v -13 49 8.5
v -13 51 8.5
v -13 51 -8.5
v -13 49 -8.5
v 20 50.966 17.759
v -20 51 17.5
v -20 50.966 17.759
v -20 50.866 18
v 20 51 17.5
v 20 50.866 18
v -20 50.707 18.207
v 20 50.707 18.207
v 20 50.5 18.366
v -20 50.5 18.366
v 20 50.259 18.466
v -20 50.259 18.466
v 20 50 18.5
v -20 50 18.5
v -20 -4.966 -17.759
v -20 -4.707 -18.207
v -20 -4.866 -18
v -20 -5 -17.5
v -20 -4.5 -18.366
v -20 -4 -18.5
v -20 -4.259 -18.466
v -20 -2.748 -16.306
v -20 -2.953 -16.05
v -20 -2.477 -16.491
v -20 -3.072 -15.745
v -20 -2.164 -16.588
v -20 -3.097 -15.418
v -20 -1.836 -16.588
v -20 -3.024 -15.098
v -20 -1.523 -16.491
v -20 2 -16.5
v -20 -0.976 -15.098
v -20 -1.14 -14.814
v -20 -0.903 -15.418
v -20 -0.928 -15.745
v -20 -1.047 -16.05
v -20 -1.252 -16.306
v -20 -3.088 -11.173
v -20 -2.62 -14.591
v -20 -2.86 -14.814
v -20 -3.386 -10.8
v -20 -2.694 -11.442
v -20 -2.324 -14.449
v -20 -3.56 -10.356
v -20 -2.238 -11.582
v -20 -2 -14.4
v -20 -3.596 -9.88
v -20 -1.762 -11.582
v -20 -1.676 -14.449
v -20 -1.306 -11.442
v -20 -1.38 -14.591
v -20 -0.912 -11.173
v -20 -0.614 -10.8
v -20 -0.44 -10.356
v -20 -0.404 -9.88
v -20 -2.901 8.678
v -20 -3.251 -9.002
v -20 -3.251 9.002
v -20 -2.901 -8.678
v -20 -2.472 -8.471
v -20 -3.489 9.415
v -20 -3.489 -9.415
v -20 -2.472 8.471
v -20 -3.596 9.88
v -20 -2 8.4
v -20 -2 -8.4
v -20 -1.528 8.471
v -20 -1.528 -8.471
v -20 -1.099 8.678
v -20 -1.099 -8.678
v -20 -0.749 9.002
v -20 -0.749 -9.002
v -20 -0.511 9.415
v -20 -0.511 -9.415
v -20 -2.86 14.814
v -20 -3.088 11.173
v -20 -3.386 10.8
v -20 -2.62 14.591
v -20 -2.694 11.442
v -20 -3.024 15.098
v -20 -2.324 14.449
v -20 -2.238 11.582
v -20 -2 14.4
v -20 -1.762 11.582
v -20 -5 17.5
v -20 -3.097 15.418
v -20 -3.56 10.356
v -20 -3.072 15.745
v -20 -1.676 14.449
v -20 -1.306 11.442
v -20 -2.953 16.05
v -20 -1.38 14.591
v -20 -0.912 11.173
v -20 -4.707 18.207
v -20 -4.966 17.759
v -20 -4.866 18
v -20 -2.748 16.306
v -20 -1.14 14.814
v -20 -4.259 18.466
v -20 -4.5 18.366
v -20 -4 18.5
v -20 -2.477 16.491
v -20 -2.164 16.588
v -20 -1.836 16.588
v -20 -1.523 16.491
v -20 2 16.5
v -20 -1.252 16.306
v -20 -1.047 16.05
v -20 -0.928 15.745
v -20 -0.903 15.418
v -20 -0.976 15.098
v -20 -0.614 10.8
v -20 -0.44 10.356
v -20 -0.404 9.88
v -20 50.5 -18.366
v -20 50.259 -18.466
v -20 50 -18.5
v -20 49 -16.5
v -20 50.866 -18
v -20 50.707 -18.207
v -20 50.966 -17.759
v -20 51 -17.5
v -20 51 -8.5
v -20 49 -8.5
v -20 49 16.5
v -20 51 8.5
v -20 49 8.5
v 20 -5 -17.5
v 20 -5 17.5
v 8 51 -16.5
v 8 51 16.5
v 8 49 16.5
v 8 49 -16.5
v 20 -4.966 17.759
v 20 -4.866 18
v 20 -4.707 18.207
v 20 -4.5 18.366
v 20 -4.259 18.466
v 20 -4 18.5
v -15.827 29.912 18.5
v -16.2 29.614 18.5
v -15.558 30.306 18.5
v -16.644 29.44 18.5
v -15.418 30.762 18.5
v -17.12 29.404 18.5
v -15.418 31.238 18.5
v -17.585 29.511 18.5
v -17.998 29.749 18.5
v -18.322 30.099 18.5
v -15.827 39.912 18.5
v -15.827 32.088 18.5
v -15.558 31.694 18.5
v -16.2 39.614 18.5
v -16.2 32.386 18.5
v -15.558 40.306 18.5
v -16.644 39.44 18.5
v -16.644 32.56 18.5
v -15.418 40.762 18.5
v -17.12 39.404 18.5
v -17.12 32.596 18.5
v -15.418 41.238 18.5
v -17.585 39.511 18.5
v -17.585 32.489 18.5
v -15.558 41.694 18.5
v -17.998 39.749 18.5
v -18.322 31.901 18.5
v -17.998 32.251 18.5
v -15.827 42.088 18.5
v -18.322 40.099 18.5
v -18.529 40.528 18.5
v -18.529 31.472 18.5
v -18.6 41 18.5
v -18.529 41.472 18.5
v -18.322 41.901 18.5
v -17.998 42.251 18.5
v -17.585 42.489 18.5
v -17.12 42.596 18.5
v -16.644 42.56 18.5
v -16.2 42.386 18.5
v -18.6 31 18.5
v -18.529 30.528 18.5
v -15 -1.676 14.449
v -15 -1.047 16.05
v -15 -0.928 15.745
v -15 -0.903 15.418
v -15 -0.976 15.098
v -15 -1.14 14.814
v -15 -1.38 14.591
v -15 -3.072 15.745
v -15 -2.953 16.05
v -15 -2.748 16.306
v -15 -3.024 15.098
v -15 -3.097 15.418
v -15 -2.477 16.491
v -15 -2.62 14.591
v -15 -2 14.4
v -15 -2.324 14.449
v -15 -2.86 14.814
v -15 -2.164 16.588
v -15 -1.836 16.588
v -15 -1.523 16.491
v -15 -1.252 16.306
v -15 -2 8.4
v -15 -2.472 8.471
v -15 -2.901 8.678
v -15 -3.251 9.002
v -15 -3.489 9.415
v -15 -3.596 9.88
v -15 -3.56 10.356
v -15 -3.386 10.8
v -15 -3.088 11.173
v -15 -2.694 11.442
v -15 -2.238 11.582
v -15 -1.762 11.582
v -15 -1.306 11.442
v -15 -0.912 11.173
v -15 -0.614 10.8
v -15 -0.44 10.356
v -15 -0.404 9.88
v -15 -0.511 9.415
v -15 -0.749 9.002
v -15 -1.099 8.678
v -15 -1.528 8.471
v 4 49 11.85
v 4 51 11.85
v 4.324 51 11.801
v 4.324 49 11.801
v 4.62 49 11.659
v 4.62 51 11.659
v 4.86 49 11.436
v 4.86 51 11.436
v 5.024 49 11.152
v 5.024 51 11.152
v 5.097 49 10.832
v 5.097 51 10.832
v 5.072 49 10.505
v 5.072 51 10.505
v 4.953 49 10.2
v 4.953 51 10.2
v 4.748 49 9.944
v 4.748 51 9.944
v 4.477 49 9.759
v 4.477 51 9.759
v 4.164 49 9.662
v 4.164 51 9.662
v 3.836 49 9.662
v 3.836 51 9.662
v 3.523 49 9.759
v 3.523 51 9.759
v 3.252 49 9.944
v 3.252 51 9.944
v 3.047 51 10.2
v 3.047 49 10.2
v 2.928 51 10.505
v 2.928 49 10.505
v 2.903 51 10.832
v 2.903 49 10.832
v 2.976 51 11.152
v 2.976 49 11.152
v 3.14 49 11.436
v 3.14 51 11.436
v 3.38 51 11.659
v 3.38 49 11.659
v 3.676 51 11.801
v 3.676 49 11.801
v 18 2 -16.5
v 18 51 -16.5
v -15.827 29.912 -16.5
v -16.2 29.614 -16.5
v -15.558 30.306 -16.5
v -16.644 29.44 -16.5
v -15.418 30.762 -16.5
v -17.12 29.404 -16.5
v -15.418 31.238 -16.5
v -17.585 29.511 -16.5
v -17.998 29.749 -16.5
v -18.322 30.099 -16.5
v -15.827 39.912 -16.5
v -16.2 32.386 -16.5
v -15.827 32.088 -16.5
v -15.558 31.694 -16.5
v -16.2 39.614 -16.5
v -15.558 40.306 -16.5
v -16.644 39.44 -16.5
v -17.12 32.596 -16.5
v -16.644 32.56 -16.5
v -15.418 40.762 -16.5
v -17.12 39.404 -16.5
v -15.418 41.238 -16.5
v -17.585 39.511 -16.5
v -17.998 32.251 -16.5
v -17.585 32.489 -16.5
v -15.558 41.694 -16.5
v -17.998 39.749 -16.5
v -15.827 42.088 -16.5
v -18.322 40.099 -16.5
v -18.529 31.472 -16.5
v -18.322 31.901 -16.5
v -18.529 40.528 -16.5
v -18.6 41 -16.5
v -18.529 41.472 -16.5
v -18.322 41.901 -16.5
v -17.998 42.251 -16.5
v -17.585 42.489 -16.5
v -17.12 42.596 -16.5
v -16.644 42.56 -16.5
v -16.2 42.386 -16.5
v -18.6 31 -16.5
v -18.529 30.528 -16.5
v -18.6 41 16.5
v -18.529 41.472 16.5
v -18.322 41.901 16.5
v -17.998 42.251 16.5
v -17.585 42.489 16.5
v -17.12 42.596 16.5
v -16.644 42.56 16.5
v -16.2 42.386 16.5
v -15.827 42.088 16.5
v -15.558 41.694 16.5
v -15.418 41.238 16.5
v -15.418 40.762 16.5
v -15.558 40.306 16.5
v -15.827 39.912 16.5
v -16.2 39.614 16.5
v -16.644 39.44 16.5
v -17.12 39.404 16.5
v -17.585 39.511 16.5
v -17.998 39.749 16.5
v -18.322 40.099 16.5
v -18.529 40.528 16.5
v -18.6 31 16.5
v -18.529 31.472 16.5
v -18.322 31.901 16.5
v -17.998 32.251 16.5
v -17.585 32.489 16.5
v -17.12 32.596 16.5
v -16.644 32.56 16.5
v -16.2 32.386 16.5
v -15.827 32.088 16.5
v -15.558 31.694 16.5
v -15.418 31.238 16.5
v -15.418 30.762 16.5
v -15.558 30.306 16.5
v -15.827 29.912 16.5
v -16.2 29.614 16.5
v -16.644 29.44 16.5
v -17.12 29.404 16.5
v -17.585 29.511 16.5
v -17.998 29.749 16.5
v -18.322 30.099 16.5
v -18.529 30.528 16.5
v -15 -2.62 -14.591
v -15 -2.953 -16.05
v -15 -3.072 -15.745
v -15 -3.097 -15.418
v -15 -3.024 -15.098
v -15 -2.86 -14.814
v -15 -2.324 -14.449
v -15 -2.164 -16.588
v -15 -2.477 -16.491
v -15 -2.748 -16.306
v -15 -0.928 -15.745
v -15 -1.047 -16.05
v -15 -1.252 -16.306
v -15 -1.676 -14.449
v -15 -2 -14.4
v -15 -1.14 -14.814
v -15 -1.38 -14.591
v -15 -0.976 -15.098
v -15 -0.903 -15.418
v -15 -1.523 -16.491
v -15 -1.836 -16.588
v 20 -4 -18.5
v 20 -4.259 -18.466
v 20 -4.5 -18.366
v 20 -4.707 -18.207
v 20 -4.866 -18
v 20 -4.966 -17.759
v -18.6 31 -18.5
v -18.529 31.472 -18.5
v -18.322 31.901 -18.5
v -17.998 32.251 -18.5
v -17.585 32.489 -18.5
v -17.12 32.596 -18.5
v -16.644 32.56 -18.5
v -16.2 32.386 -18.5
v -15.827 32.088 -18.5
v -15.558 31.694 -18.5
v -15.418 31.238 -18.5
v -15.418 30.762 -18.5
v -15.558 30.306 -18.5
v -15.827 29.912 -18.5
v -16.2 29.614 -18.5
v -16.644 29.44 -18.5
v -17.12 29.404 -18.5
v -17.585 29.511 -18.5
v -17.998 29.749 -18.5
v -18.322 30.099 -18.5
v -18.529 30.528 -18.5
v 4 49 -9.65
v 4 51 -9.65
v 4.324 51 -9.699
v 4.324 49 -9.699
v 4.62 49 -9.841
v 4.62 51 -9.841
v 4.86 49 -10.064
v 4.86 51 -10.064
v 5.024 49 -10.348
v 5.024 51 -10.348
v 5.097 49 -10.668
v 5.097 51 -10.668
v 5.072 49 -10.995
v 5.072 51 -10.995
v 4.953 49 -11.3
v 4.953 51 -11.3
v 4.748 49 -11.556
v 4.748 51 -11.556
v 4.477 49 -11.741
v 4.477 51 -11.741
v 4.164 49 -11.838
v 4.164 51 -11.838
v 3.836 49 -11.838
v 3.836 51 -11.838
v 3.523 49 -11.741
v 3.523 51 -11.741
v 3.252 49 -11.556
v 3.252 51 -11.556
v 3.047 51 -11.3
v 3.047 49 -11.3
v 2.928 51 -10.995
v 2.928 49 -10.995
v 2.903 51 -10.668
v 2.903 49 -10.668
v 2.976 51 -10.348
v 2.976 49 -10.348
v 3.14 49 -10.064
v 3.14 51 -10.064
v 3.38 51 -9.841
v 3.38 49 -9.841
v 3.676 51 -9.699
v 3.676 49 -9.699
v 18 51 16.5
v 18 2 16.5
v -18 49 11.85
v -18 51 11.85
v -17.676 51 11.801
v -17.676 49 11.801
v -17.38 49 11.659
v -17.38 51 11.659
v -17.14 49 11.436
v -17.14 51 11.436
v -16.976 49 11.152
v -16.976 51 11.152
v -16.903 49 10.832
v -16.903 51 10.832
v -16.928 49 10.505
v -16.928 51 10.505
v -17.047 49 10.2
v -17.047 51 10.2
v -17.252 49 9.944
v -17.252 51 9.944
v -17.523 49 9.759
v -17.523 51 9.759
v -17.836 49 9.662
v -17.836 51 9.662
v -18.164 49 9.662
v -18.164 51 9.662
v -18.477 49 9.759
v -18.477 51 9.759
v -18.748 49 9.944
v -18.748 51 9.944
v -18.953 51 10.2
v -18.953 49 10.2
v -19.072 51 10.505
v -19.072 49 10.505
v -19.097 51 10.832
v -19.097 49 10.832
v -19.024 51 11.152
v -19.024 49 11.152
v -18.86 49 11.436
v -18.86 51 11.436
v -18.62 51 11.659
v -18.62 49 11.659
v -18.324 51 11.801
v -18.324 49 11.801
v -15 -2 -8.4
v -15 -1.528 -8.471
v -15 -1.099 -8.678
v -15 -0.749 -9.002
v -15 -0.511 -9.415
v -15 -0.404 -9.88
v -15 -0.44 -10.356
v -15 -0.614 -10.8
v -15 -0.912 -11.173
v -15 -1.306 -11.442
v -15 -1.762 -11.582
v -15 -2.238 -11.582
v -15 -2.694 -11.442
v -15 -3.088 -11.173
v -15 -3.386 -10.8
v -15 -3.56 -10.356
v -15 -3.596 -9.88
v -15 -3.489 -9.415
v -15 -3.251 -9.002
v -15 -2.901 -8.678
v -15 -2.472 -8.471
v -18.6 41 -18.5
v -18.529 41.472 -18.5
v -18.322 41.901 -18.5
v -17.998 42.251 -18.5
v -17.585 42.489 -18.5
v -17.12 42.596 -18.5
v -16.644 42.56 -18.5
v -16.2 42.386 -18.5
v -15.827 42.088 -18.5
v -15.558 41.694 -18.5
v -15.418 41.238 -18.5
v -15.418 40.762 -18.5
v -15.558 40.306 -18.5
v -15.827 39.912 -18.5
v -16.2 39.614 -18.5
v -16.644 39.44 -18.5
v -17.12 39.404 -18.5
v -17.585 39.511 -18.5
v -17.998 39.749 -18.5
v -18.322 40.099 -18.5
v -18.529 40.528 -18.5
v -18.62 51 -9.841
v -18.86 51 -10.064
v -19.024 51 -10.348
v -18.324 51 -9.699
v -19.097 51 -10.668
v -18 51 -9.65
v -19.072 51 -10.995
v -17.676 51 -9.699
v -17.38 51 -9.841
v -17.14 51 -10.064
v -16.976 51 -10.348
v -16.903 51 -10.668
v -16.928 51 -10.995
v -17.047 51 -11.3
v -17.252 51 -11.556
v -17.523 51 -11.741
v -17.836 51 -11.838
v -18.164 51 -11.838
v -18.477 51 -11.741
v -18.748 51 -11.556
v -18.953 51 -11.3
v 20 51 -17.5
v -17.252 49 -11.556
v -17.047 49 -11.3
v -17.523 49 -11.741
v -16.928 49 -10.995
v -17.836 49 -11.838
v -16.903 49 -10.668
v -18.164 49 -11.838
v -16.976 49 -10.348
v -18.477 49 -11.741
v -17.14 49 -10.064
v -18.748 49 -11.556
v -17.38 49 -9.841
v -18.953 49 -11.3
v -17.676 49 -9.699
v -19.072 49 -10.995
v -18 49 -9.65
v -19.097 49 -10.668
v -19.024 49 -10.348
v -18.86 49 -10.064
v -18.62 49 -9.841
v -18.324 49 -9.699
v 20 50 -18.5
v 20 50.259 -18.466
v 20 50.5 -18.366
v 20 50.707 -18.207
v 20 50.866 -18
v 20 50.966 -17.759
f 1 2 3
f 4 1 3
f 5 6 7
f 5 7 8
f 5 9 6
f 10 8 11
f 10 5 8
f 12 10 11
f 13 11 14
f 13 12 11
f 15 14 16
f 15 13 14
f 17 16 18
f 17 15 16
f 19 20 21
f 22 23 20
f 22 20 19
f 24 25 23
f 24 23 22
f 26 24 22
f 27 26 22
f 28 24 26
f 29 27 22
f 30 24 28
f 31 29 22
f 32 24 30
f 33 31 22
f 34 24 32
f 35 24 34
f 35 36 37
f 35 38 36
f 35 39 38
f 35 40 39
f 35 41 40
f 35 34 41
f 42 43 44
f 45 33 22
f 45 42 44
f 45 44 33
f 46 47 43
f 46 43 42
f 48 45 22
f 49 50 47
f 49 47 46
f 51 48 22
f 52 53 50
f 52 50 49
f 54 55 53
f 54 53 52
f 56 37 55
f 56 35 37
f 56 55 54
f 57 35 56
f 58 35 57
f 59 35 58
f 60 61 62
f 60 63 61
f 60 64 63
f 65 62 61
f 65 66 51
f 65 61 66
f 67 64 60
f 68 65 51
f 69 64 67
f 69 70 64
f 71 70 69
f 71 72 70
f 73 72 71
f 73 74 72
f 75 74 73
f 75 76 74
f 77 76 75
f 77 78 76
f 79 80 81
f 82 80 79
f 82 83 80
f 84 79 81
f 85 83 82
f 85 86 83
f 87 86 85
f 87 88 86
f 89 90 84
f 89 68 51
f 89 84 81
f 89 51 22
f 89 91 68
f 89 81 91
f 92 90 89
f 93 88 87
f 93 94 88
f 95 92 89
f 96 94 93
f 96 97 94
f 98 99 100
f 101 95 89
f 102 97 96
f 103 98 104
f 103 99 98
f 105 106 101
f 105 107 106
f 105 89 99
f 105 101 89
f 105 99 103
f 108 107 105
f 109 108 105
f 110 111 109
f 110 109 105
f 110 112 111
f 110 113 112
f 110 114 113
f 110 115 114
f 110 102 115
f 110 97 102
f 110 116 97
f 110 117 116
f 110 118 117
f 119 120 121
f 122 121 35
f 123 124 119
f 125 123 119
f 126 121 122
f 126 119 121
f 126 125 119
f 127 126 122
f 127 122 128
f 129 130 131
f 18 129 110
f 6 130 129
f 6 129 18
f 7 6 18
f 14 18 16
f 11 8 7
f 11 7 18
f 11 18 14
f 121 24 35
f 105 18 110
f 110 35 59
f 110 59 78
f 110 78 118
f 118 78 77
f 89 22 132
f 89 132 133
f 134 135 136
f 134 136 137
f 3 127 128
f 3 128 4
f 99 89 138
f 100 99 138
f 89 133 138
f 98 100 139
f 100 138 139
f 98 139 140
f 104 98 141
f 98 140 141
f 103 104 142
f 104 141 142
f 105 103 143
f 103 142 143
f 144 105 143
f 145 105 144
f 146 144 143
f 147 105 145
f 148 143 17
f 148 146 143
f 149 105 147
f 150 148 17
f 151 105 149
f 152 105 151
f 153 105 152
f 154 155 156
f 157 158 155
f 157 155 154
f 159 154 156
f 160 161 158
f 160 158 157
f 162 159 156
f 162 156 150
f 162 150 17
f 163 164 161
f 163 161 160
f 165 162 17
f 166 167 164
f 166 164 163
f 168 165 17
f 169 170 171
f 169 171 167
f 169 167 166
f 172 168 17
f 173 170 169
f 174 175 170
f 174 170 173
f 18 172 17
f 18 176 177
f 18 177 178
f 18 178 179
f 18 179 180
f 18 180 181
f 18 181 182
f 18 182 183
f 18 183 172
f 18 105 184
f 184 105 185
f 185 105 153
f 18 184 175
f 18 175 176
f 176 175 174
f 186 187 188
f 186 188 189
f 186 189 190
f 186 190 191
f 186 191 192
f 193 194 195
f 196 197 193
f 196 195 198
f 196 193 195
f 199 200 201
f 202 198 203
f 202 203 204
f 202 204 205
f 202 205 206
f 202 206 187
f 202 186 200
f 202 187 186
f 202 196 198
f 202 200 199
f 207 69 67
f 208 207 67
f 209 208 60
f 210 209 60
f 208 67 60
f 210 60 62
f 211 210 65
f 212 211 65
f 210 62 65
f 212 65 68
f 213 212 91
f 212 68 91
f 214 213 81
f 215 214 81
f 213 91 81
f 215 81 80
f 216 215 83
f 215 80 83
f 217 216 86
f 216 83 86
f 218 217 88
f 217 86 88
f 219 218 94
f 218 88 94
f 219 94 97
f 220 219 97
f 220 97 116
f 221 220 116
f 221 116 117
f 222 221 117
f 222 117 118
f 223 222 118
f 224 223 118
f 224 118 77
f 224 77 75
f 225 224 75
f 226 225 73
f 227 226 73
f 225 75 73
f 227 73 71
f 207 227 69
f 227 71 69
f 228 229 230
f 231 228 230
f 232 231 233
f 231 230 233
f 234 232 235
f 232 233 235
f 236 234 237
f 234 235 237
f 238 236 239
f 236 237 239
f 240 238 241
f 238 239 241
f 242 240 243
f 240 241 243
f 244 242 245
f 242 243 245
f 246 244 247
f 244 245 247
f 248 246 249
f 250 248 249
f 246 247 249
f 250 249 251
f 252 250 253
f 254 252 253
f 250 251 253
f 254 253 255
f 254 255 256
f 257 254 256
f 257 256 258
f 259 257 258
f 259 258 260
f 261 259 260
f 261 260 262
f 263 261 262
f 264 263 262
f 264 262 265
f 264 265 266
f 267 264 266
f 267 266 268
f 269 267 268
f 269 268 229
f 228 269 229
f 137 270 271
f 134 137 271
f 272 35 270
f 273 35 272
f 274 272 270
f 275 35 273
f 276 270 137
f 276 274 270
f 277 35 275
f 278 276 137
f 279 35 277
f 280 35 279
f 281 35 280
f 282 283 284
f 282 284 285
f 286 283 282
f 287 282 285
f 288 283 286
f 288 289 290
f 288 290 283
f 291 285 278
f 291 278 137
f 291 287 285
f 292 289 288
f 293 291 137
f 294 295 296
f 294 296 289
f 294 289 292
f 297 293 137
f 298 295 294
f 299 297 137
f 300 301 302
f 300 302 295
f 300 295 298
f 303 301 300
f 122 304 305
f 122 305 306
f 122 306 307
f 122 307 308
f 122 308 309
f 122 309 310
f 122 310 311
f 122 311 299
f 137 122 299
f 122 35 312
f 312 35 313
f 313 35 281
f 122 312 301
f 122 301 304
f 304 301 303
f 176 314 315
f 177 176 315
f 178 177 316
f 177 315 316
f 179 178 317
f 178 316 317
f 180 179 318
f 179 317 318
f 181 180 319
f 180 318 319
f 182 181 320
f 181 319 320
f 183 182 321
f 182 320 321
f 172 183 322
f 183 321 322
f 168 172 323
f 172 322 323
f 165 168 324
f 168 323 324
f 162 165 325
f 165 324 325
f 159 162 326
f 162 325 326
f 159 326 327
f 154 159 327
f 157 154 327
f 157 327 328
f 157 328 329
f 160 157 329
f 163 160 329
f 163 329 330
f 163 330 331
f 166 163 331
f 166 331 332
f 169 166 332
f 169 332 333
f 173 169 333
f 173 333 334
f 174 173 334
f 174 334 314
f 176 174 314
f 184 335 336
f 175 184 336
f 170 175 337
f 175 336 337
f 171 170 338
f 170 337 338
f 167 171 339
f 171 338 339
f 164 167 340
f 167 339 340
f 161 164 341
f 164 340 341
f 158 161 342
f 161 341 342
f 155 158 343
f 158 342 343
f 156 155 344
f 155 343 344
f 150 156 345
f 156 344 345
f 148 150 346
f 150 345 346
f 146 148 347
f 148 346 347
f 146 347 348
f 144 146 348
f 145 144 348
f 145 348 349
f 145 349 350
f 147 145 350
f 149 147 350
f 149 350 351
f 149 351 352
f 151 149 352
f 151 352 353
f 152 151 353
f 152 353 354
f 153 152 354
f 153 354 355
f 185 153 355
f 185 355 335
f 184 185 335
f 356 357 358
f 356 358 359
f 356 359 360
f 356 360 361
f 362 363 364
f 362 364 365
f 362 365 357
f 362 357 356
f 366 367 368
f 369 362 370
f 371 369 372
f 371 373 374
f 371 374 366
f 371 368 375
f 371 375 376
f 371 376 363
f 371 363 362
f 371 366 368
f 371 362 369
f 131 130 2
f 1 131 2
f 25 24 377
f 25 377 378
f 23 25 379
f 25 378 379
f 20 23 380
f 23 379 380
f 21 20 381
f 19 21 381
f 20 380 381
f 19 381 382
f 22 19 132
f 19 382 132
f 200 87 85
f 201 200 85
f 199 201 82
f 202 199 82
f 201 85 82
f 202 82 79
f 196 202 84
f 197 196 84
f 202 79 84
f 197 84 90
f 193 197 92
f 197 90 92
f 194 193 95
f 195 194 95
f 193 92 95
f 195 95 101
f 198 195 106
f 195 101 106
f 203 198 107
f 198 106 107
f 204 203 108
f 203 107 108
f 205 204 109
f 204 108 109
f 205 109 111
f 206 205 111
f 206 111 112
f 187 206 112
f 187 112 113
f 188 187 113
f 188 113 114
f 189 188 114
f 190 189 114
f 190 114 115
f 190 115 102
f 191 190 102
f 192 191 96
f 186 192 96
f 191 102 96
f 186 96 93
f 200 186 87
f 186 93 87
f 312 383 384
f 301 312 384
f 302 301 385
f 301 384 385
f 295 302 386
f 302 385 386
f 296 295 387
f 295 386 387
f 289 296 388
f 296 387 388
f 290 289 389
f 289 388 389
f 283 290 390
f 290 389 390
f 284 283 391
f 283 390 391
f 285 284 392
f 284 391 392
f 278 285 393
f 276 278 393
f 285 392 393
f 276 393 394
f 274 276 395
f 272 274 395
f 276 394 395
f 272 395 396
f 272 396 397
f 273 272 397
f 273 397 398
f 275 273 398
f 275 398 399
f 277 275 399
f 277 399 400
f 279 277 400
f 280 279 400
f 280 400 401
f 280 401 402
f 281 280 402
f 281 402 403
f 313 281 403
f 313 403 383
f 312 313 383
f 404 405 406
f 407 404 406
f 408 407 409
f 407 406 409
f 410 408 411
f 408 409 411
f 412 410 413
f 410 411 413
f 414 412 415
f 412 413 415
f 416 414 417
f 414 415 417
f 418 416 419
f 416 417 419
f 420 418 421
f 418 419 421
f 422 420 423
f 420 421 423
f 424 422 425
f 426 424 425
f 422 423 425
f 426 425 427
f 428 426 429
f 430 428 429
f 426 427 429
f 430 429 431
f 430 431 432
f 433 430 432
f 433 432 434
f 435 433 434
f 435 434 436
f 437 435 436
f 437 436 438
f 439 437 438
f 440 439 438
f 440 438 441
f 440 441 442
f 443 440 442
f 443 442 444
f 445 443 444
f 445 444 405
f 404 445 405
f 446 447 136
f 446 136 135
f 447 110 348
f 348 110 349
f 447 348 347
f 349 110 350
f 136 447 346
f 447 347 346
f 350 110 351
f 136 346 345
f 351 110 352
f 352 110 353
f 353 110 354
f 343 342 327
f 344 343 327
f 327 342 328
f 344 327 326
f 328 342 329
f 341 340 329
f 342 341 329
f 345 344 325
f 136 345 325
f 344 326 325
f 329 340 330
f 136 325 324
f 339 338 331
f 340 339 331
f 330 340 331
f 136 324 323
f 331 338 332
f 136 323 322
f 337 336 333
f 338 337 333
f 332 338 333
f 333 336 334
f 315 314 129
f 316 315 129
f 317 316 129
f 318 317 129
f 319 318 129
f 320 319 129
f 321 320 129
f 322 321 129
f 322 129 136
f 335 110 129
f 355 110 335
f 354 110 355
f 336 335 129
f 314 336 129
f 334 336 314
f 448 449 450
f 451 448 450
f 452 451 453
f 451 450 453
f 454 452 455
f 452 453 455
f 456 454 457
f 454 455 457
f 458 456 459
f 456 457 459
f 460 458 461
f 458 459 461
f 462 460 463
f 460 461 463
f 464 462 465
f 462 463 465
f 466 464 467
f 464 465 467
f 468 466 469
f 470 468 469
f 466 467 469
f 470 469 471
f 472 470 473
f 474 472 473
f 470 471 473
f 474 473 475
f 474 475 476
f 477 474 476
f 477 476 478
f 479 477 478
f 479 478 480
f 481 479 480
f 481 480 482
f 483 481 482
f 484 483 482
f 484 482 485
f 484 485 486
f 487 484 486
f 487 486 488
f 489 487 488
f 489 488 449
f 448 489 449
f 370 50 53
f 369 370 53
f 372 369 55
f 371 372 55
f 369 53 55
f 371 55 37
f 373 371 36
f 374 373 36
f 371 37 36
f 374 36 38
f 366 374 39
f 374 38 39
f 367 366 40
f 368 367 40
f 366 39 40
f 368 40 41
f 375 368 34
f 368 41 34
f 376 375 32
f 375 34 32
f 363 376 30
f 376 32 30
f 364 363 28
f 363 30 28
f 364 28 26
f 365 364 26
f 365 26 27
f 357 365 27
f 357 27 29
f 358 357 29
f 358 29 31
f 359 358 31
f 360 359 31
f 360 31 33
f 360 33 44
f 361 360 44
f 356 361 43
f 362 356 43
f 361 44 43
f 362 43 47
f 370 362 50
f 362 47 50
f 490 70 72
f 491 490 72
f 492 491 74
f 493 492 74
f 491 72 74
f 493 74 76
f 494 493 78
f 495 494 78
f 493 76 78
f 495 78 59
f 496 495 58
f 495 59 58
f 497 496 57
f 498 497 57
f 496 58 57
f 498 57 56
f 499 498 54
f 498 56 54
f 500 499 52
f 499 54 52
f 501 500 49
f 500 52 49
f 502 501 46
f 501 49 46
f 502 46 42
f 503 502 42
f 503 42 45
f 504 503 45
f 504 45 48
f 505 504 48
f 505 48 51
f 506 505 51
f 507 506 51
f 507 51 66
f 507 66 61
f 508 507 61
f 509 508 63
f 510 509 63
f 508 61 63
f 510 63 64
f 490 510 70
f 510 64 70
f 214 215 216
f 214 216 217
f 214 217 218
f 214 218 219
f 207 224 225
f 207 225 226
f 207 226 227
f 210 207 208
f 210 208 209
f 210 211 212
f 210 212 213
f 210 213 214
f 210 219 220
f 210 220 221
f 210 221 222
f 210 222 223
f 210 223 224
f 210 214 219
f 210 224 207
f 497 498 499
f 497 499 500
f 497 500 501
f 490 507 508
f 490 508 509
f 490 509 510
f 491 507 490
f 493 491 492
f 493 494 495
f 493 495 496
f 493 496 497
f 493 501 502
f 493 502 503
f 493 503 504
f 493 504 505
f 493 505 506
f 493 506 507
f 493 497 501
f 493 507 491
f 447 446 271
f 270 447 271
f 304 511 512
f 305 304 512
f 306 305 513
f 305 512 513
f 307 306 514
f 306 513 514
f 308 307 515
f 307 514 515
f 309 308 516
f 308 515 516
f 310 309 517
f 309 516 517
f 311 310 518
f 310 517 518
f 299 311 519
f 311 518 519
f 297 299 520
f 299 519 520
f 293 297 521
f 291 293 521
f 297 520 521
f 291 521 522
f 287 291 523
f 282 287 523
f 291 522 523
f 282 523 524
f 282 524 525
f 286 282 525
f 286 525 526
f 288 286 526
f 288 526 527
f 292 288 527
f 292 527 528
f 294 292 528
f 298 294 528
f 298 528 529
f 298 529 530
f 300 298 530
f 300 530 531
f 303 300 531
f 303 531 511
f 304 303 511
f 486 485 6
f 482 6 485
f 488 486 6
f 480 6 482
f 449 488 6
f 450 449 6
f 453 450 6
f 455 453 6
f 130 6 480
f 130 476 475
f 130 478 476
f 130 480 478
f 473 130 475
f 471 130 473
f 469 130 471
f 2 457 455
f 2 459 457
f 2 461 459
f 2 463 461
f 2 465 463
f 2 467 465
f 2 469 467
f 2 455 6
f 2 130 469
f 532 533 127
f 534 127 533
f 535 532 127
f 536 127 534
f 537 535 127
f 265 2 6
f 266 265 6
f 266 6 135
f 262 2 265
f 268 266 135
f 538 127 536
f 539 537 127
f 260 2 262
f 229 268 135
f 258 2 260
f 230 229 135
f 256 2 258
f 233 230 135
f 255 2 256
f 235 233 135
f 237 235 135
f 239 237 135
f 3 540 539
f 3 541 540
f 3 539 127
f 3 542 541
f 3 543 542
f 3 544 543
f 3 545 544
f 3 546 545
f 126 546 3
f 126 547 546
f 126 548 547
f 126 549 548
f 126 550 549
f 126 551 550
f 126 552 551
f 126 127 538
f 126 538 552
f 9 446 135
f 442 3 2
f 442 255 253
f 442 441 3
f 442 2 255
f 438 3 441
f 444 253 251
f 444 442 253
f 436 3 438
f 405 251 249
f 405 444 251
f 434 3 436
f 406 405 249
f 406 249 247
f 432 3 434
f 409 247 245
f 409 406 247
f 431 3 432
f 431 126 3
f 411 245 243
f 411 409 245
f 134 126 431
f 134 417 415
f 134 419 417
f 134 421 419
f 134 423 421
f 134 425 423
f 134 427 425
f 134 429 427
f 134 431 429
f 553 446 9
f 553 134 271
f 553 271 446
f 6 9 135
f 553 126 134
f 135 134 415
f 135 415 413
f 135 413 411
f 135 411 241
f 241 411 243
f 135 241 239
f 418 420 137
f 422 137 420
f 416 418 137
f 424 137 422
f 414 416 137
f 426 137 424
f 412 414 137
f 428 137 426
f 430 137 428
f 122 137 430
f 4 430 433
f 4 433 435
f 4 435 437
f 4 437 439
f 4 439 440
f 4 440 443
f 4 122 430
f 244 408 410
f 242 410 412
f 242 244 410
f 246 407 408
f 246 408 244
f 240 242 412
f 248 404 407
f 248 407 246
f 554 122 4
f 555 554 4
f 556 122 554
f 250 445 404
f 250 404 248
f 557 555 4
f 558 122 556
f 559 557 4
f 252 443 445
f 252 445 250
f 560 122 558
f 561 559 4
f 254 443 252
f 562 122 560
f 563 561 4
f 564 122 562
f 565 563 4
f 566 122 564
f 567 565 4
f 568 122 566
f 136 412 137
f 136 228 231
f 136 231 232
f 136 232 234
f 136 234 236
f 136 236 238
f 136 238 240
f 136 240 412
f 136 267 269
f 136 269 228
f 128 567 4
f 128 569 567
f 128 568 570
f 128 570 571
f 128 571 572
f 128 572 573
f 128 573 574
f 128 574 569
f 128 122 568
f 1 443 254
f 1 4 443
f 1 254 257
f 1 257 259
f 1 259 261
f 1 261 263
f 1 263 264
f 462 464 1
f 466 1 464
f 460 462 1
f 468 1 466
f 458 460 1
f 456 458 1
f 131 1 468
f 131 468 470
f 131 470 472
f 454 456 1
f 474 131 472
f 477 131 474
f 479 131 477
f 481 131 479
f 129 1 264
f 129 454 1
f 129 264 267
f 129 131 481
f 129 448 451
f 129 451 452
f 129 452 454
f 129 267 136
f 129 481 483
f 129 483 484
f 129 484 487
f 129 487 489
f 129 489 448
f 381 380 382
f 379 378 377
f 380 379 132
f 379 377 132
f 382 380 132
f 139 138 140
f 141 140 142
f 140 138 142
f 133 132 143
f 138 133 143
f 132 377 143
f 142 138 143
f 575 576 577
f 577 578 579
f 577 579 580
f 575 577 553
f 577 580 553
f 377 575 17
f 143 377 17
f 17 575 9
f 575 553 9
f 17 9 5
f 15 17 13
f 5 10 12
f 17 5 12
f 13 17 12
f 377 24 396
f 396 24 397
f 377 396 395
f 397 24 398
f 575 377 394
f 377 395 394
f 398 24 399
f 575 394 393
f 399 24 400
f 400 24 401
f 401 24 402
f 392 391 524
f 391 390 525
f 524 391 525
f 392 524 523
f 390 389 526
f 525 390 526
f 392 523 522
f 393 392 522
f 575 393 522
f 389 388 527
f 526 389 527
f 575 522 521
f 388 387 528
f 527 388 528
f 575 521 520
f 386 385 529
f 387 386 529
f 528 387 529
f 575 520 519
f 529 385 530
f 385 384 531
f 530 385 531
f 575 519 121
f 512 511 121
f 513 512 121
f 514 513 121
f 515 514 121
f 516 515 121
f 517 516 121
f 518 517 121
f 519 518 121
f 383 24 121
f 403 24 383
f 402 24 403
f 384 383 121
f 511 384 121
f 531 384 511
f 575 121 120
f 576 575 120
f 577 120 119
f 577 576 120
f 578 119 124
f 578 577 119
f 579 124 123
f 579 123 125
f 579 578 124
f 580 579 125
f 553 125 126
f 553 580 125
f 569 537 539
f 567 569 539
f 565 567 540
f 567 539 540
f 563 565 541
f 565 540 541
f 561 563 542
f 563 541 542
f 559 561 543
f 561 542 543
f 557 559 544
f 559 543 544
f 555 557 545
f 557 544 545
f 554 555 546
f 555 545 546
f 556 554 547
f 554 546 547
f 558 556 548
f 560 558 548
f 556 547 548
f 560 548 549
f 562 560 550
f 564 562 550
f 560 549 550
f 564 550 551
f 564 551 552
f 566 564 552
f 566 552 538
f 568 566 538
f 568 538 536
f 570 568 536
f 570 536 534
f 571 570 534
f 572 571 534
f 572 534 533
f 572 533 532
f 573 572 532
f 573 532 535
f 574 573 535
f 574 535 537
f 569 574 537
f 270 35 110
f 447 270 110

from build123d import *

# Parameters (mm, degrees)
SKETCH_1_W          = 40
SKETCH_1_H          = 37
EXTRUDE_1_DEPTH     = 51
SKETCH_3_W          = 33
SKETCH_3_H          = 47
CUT_EXTRUDE_2_DEPTH = 38
CUT_EXTRUDE_3_REACH = 59.821
SKETCH_4_W          = 10
SKETCH_4_H          = 33
CUT_EXTRUDE_4_REACH = 59.821
SKETCH_5_W          = 7
SKETCH_5_H          = 17
CUT_EXTRUDE_5_REACH = 59.821
SKETCH_6_R          = 1.1
SKETCH_7_W          = 37
SKETCH_7_H          = 5
EXTRUDE_2_DEPTH     = 40
SKETCH_9_R          = 1.6
SKETCH_9_R_2        = 1.1
CUT_EXTRUDE_6_DEPTH = 5
CUT_EXTRUDE_7_REACH = 68.106
SKETCH_12_R         = 1.6
FILLET_1_R          = 1


with BuildPart() as part:
    # 草图1 → 凸台-拉伸1 (new body)
    with BuildSketch(Plane(origin=(0, 0, 0), x_dir=(1, 0, 0), z_dir=(0, 1, 0))):
        Rectangle(SKETCH_1_W, SKETCH_1_H)
    extrude(amount=EXTRUDE_1_DEPTH)

    # 草图3 → 切除-拉伸2 (cut)
    with BuildSketch(Plane.ZY.offset(20)):
        with Locations((0, 25.5)):
            Rectangle(SKETCH_3_W, SKETCH_3_H)
    extrude(amount=-CUT_EXTRUDE_2_DEPTH, mode=Mode.SUBTRACT)

    # 草图4 → 切除-拉伸3 (cut, up to next)
    with BuildSketch(Plane(origin=(0, 51, 0), x_dir=(1, 0, 0), z_dir=(0, 1, 0)), mode=Mode.PRIVATE) as cut_extrude_3_sk1:
        with Locations((13, 0)):
            Rectangle(SKETCH_4_W, SKETCH_4_H)
    cut_extrude_3_tool1 = extrude(cut_extrude_3_sk1.sketch, amount=-CUT_EXTRUDE_3_REACH, mode=Mode.PRIVATE) & part.part
    add(cut_extrude_3_tool1.solids().sort_by_distance((13, 51, 0))[0], mode=Mode.SUBTRACT)

    # 草图5 → 切除-拉伸4 (cut, up to next)
    with BuildSketch(Plane(origin=(0, 51, 0), x_dir=(1, 0, 0), z_dir=(0, 1, 0)), mode=Mode.PRIVATE) as cut_extrude_4_sk1:
        with Locations((-16.5, 0)):
            Rectangle(SKETCH_5_W, SKETCH_5_H)
    cut_extrude_4_tool1 = extrude(cut_extrude_4_sk1.sketch, amount=-CUT_EXTRUDE_4_REACH, mode=Mode.PRIVATE) & part.part
    add(cut_extrude_4_tool1.solids().sort_by_distance((-16.5, 51, 0))[0], mode=Mode.SUBTRACT)

    # 草图6 → 切除-拉伸5 (cut, up to next)
    with BuildSketch(Plane(origin=(0, 51, 0), x_dir=(1, 0, 0), z_dir=(0, 1, 0)), mode=Mode.PRIVATE) as cut_extrude_5_sk1:
        with Locations(Location((-18, 10.75, 0), (0, 0, 270))):
            Circle(SKETCH_6_R)
    cut_extrude_5_tool1 = extrude(cut_extrude_5_sk1.sketch, amount=-CUT_EXTRUDE_5_REACH, mode=Mode.PRIVATE) & part.part
    # 草图6 → 切除-拉伸5 (cut, up to next)
    with BuildSketch(Plane(origin=(0, 51, 0), x_dir=(1, 0, 0), z_dir=(0, 1, 0)), mode=Mode.PRIVATE) as cut_extrude_5_sk2:
        with Locations(Location((-18, -10.75, 0), (0, 0, 270))):
            Circle(SKETCH_6_R)
    cut_extrude_5_tool2 = extrude(cut_extrude_5_sk2.sketch, amount=-CUT_EXTRUDE_5_REACH, mode=Mode.PRIVATE) & part.part
    # 草图6 → 切除-拉伸5 (cut, up to next)
    with BuildSketch(Plane(origin=(0, 51, 0), x_dir=(1, 0, 0), z_dir=(0, 1, 0)), mode=Mode.PRIVATE) as cut_extrude_5_sk3:
        with Locations(Location((4, 10.75, 0), (0, 0, 270))):
            Circle(SKETCH_6_R)
    cut_extrude_5_tool3 = extrude(cut_extrude_5_sk3.sketch, amount=-CUT_EXTRUDE_5_REACH, mode=Mode.PRIVATE) & part.part
    # 草图6 → 切除-拉伸5 (cut, up to next)
    with BuildSketch(Plane(origin=(0, 51, 0), x_dir=(1, 0, 0), z_dir=(0, 1, 0)), mode=Mode.PRIVATE) as cut_extrude_5_sk4:
        with Locations(Location((4, -10.75, 0), (0, 0, 270))):
            Circle(SKETCH_6_R)
    cut_extrude_5_tool4 = extrude(cut_extrude_5_sk4.sketch, amount=-CUT_EXTRUDE_5_REACH, mode=Mode.PRIVATE) & part.part
    add(cut_extrude_5_tool1.solids().sort_by_distance((-18, 51, -10.75))[0], mode=Mode.SUBTRACT)
    add(cut_extrude_5_tool2.solids().sort_by_distance((-18, 51, 10.75))[0], mode=Mode.SUBTRACT)
    add(cut_extrude_5_tool3.solids().sort_by_distance((4, 51, -10.75))[0], mode=Mode.SUBTRACT)
    add(cut_extrude_5_tool4.solids().sort_by_distance((4, 51, 10.75))[0], mode=Mode.SUBTRACT)

    # 草图7 → 凸台-拉伸2 (add)
    with BuildSketch(Plane.ZY.offset(20)):
        with Locations((0, -2.5)):
            Rectangle(SKETCH_7_W, SKETCH_7_H)
    extrude(amount=-EXTRUDE_2_DEPTH)

    # 草图9 → 切除-拉伸6 (cut)
    with BuildSketch(Plane.ZY.offset(20)):
        with Locations((-10, -2)):
            Circle(SKETCH_9_R)
        with Locations(Location((10, -2, 0), (0, 0, 180))):
            Circle(SKETCH_9_R)
        with Locations((-15.5, -2)):
            Circle(SKETCH_9_R_2)
        with Locations(Location((15.5, -2, 0), (0, 0, 180))):
            Circle(SKETCH_9_R_2)
    extrude(amount=-CUT_EXTRUDE_6_DEPTH, mode=Mode.SUBTRACT)

    # 切除-拉伸7: up to this face of the body (flat: up to its plane)
    cut_extrude_7_end = Plane(part.part.faces().sort_by_distance((0, 23, 18.5))[0])
    # 草图12 → 切除-拉伸7 (cut, up to the picked face)
    with BuildSketch(Plane(origin=(0, 0, -18.5), x_dir=(-1, 0, 0), z_dir=(0, 0, -1)), mode=Mode.PRIVATE) as cut_extrude_7_sk1:
        with Locations((17, 41)):
            Circle(SKETCH_12_R)
    cut_extrude_7_tool1 = split(extrude(cut_extrude_7_sk1.sketch, amount=-CUT_EXTRUDE_7_REACH, mode=Mode.PRIVATE), bisect_by=cut_extrude_7_end, keep=Keep.BOTH, mode=Mode.PRIVATE)
    # 草图12 → 切除-拉伸7 (cut, up to the picked face)
    with BuildSketch(Plane(origin=(0, 0, -18.5), x_dir=(-1, 0, 0), z_dir=(0, 0, -1)), mode=Mode.PRIVATE) as cut_extrude_7_sk2:
        with Locations((17, 31)):
            Circle(SKETCH_12_R)
    cut_extrude_7_tool2 = split(extrude(cut_extrude_7_sk2.sketch, amount=-CUT_EXTRUDE_7_REACH, mode=Mode.PRIVATE), bisect_by=cut_extrude_7_end, keep=Keep.BOTH, mode=Mode.PRIVATE)
    add(cut_extrude_7_tool1.solids().sort_by(Axis((-17, 41, -18.5), (0, 0, 1)))[0], mode=Mode.SUBTRACT)
    add(cut_extrude_7_tool2.solids().sort_by(Axis((-17, 31, -18.5), (0, 0, 1)))[0], mode=Mode.SUBTRACT)

    # 圆角1
    fillet_1_edges = [part.edges().sort_by_distance(p)[0] for p in [
        (0, 51, 18.5),
        (0, -5, -18.5),
        (0, -5, 18.5),
        (0, 51, -18.5),
    ]]
    fillet(fillet_1_edges, radius=FILLET_1_R)


solid = part.part
